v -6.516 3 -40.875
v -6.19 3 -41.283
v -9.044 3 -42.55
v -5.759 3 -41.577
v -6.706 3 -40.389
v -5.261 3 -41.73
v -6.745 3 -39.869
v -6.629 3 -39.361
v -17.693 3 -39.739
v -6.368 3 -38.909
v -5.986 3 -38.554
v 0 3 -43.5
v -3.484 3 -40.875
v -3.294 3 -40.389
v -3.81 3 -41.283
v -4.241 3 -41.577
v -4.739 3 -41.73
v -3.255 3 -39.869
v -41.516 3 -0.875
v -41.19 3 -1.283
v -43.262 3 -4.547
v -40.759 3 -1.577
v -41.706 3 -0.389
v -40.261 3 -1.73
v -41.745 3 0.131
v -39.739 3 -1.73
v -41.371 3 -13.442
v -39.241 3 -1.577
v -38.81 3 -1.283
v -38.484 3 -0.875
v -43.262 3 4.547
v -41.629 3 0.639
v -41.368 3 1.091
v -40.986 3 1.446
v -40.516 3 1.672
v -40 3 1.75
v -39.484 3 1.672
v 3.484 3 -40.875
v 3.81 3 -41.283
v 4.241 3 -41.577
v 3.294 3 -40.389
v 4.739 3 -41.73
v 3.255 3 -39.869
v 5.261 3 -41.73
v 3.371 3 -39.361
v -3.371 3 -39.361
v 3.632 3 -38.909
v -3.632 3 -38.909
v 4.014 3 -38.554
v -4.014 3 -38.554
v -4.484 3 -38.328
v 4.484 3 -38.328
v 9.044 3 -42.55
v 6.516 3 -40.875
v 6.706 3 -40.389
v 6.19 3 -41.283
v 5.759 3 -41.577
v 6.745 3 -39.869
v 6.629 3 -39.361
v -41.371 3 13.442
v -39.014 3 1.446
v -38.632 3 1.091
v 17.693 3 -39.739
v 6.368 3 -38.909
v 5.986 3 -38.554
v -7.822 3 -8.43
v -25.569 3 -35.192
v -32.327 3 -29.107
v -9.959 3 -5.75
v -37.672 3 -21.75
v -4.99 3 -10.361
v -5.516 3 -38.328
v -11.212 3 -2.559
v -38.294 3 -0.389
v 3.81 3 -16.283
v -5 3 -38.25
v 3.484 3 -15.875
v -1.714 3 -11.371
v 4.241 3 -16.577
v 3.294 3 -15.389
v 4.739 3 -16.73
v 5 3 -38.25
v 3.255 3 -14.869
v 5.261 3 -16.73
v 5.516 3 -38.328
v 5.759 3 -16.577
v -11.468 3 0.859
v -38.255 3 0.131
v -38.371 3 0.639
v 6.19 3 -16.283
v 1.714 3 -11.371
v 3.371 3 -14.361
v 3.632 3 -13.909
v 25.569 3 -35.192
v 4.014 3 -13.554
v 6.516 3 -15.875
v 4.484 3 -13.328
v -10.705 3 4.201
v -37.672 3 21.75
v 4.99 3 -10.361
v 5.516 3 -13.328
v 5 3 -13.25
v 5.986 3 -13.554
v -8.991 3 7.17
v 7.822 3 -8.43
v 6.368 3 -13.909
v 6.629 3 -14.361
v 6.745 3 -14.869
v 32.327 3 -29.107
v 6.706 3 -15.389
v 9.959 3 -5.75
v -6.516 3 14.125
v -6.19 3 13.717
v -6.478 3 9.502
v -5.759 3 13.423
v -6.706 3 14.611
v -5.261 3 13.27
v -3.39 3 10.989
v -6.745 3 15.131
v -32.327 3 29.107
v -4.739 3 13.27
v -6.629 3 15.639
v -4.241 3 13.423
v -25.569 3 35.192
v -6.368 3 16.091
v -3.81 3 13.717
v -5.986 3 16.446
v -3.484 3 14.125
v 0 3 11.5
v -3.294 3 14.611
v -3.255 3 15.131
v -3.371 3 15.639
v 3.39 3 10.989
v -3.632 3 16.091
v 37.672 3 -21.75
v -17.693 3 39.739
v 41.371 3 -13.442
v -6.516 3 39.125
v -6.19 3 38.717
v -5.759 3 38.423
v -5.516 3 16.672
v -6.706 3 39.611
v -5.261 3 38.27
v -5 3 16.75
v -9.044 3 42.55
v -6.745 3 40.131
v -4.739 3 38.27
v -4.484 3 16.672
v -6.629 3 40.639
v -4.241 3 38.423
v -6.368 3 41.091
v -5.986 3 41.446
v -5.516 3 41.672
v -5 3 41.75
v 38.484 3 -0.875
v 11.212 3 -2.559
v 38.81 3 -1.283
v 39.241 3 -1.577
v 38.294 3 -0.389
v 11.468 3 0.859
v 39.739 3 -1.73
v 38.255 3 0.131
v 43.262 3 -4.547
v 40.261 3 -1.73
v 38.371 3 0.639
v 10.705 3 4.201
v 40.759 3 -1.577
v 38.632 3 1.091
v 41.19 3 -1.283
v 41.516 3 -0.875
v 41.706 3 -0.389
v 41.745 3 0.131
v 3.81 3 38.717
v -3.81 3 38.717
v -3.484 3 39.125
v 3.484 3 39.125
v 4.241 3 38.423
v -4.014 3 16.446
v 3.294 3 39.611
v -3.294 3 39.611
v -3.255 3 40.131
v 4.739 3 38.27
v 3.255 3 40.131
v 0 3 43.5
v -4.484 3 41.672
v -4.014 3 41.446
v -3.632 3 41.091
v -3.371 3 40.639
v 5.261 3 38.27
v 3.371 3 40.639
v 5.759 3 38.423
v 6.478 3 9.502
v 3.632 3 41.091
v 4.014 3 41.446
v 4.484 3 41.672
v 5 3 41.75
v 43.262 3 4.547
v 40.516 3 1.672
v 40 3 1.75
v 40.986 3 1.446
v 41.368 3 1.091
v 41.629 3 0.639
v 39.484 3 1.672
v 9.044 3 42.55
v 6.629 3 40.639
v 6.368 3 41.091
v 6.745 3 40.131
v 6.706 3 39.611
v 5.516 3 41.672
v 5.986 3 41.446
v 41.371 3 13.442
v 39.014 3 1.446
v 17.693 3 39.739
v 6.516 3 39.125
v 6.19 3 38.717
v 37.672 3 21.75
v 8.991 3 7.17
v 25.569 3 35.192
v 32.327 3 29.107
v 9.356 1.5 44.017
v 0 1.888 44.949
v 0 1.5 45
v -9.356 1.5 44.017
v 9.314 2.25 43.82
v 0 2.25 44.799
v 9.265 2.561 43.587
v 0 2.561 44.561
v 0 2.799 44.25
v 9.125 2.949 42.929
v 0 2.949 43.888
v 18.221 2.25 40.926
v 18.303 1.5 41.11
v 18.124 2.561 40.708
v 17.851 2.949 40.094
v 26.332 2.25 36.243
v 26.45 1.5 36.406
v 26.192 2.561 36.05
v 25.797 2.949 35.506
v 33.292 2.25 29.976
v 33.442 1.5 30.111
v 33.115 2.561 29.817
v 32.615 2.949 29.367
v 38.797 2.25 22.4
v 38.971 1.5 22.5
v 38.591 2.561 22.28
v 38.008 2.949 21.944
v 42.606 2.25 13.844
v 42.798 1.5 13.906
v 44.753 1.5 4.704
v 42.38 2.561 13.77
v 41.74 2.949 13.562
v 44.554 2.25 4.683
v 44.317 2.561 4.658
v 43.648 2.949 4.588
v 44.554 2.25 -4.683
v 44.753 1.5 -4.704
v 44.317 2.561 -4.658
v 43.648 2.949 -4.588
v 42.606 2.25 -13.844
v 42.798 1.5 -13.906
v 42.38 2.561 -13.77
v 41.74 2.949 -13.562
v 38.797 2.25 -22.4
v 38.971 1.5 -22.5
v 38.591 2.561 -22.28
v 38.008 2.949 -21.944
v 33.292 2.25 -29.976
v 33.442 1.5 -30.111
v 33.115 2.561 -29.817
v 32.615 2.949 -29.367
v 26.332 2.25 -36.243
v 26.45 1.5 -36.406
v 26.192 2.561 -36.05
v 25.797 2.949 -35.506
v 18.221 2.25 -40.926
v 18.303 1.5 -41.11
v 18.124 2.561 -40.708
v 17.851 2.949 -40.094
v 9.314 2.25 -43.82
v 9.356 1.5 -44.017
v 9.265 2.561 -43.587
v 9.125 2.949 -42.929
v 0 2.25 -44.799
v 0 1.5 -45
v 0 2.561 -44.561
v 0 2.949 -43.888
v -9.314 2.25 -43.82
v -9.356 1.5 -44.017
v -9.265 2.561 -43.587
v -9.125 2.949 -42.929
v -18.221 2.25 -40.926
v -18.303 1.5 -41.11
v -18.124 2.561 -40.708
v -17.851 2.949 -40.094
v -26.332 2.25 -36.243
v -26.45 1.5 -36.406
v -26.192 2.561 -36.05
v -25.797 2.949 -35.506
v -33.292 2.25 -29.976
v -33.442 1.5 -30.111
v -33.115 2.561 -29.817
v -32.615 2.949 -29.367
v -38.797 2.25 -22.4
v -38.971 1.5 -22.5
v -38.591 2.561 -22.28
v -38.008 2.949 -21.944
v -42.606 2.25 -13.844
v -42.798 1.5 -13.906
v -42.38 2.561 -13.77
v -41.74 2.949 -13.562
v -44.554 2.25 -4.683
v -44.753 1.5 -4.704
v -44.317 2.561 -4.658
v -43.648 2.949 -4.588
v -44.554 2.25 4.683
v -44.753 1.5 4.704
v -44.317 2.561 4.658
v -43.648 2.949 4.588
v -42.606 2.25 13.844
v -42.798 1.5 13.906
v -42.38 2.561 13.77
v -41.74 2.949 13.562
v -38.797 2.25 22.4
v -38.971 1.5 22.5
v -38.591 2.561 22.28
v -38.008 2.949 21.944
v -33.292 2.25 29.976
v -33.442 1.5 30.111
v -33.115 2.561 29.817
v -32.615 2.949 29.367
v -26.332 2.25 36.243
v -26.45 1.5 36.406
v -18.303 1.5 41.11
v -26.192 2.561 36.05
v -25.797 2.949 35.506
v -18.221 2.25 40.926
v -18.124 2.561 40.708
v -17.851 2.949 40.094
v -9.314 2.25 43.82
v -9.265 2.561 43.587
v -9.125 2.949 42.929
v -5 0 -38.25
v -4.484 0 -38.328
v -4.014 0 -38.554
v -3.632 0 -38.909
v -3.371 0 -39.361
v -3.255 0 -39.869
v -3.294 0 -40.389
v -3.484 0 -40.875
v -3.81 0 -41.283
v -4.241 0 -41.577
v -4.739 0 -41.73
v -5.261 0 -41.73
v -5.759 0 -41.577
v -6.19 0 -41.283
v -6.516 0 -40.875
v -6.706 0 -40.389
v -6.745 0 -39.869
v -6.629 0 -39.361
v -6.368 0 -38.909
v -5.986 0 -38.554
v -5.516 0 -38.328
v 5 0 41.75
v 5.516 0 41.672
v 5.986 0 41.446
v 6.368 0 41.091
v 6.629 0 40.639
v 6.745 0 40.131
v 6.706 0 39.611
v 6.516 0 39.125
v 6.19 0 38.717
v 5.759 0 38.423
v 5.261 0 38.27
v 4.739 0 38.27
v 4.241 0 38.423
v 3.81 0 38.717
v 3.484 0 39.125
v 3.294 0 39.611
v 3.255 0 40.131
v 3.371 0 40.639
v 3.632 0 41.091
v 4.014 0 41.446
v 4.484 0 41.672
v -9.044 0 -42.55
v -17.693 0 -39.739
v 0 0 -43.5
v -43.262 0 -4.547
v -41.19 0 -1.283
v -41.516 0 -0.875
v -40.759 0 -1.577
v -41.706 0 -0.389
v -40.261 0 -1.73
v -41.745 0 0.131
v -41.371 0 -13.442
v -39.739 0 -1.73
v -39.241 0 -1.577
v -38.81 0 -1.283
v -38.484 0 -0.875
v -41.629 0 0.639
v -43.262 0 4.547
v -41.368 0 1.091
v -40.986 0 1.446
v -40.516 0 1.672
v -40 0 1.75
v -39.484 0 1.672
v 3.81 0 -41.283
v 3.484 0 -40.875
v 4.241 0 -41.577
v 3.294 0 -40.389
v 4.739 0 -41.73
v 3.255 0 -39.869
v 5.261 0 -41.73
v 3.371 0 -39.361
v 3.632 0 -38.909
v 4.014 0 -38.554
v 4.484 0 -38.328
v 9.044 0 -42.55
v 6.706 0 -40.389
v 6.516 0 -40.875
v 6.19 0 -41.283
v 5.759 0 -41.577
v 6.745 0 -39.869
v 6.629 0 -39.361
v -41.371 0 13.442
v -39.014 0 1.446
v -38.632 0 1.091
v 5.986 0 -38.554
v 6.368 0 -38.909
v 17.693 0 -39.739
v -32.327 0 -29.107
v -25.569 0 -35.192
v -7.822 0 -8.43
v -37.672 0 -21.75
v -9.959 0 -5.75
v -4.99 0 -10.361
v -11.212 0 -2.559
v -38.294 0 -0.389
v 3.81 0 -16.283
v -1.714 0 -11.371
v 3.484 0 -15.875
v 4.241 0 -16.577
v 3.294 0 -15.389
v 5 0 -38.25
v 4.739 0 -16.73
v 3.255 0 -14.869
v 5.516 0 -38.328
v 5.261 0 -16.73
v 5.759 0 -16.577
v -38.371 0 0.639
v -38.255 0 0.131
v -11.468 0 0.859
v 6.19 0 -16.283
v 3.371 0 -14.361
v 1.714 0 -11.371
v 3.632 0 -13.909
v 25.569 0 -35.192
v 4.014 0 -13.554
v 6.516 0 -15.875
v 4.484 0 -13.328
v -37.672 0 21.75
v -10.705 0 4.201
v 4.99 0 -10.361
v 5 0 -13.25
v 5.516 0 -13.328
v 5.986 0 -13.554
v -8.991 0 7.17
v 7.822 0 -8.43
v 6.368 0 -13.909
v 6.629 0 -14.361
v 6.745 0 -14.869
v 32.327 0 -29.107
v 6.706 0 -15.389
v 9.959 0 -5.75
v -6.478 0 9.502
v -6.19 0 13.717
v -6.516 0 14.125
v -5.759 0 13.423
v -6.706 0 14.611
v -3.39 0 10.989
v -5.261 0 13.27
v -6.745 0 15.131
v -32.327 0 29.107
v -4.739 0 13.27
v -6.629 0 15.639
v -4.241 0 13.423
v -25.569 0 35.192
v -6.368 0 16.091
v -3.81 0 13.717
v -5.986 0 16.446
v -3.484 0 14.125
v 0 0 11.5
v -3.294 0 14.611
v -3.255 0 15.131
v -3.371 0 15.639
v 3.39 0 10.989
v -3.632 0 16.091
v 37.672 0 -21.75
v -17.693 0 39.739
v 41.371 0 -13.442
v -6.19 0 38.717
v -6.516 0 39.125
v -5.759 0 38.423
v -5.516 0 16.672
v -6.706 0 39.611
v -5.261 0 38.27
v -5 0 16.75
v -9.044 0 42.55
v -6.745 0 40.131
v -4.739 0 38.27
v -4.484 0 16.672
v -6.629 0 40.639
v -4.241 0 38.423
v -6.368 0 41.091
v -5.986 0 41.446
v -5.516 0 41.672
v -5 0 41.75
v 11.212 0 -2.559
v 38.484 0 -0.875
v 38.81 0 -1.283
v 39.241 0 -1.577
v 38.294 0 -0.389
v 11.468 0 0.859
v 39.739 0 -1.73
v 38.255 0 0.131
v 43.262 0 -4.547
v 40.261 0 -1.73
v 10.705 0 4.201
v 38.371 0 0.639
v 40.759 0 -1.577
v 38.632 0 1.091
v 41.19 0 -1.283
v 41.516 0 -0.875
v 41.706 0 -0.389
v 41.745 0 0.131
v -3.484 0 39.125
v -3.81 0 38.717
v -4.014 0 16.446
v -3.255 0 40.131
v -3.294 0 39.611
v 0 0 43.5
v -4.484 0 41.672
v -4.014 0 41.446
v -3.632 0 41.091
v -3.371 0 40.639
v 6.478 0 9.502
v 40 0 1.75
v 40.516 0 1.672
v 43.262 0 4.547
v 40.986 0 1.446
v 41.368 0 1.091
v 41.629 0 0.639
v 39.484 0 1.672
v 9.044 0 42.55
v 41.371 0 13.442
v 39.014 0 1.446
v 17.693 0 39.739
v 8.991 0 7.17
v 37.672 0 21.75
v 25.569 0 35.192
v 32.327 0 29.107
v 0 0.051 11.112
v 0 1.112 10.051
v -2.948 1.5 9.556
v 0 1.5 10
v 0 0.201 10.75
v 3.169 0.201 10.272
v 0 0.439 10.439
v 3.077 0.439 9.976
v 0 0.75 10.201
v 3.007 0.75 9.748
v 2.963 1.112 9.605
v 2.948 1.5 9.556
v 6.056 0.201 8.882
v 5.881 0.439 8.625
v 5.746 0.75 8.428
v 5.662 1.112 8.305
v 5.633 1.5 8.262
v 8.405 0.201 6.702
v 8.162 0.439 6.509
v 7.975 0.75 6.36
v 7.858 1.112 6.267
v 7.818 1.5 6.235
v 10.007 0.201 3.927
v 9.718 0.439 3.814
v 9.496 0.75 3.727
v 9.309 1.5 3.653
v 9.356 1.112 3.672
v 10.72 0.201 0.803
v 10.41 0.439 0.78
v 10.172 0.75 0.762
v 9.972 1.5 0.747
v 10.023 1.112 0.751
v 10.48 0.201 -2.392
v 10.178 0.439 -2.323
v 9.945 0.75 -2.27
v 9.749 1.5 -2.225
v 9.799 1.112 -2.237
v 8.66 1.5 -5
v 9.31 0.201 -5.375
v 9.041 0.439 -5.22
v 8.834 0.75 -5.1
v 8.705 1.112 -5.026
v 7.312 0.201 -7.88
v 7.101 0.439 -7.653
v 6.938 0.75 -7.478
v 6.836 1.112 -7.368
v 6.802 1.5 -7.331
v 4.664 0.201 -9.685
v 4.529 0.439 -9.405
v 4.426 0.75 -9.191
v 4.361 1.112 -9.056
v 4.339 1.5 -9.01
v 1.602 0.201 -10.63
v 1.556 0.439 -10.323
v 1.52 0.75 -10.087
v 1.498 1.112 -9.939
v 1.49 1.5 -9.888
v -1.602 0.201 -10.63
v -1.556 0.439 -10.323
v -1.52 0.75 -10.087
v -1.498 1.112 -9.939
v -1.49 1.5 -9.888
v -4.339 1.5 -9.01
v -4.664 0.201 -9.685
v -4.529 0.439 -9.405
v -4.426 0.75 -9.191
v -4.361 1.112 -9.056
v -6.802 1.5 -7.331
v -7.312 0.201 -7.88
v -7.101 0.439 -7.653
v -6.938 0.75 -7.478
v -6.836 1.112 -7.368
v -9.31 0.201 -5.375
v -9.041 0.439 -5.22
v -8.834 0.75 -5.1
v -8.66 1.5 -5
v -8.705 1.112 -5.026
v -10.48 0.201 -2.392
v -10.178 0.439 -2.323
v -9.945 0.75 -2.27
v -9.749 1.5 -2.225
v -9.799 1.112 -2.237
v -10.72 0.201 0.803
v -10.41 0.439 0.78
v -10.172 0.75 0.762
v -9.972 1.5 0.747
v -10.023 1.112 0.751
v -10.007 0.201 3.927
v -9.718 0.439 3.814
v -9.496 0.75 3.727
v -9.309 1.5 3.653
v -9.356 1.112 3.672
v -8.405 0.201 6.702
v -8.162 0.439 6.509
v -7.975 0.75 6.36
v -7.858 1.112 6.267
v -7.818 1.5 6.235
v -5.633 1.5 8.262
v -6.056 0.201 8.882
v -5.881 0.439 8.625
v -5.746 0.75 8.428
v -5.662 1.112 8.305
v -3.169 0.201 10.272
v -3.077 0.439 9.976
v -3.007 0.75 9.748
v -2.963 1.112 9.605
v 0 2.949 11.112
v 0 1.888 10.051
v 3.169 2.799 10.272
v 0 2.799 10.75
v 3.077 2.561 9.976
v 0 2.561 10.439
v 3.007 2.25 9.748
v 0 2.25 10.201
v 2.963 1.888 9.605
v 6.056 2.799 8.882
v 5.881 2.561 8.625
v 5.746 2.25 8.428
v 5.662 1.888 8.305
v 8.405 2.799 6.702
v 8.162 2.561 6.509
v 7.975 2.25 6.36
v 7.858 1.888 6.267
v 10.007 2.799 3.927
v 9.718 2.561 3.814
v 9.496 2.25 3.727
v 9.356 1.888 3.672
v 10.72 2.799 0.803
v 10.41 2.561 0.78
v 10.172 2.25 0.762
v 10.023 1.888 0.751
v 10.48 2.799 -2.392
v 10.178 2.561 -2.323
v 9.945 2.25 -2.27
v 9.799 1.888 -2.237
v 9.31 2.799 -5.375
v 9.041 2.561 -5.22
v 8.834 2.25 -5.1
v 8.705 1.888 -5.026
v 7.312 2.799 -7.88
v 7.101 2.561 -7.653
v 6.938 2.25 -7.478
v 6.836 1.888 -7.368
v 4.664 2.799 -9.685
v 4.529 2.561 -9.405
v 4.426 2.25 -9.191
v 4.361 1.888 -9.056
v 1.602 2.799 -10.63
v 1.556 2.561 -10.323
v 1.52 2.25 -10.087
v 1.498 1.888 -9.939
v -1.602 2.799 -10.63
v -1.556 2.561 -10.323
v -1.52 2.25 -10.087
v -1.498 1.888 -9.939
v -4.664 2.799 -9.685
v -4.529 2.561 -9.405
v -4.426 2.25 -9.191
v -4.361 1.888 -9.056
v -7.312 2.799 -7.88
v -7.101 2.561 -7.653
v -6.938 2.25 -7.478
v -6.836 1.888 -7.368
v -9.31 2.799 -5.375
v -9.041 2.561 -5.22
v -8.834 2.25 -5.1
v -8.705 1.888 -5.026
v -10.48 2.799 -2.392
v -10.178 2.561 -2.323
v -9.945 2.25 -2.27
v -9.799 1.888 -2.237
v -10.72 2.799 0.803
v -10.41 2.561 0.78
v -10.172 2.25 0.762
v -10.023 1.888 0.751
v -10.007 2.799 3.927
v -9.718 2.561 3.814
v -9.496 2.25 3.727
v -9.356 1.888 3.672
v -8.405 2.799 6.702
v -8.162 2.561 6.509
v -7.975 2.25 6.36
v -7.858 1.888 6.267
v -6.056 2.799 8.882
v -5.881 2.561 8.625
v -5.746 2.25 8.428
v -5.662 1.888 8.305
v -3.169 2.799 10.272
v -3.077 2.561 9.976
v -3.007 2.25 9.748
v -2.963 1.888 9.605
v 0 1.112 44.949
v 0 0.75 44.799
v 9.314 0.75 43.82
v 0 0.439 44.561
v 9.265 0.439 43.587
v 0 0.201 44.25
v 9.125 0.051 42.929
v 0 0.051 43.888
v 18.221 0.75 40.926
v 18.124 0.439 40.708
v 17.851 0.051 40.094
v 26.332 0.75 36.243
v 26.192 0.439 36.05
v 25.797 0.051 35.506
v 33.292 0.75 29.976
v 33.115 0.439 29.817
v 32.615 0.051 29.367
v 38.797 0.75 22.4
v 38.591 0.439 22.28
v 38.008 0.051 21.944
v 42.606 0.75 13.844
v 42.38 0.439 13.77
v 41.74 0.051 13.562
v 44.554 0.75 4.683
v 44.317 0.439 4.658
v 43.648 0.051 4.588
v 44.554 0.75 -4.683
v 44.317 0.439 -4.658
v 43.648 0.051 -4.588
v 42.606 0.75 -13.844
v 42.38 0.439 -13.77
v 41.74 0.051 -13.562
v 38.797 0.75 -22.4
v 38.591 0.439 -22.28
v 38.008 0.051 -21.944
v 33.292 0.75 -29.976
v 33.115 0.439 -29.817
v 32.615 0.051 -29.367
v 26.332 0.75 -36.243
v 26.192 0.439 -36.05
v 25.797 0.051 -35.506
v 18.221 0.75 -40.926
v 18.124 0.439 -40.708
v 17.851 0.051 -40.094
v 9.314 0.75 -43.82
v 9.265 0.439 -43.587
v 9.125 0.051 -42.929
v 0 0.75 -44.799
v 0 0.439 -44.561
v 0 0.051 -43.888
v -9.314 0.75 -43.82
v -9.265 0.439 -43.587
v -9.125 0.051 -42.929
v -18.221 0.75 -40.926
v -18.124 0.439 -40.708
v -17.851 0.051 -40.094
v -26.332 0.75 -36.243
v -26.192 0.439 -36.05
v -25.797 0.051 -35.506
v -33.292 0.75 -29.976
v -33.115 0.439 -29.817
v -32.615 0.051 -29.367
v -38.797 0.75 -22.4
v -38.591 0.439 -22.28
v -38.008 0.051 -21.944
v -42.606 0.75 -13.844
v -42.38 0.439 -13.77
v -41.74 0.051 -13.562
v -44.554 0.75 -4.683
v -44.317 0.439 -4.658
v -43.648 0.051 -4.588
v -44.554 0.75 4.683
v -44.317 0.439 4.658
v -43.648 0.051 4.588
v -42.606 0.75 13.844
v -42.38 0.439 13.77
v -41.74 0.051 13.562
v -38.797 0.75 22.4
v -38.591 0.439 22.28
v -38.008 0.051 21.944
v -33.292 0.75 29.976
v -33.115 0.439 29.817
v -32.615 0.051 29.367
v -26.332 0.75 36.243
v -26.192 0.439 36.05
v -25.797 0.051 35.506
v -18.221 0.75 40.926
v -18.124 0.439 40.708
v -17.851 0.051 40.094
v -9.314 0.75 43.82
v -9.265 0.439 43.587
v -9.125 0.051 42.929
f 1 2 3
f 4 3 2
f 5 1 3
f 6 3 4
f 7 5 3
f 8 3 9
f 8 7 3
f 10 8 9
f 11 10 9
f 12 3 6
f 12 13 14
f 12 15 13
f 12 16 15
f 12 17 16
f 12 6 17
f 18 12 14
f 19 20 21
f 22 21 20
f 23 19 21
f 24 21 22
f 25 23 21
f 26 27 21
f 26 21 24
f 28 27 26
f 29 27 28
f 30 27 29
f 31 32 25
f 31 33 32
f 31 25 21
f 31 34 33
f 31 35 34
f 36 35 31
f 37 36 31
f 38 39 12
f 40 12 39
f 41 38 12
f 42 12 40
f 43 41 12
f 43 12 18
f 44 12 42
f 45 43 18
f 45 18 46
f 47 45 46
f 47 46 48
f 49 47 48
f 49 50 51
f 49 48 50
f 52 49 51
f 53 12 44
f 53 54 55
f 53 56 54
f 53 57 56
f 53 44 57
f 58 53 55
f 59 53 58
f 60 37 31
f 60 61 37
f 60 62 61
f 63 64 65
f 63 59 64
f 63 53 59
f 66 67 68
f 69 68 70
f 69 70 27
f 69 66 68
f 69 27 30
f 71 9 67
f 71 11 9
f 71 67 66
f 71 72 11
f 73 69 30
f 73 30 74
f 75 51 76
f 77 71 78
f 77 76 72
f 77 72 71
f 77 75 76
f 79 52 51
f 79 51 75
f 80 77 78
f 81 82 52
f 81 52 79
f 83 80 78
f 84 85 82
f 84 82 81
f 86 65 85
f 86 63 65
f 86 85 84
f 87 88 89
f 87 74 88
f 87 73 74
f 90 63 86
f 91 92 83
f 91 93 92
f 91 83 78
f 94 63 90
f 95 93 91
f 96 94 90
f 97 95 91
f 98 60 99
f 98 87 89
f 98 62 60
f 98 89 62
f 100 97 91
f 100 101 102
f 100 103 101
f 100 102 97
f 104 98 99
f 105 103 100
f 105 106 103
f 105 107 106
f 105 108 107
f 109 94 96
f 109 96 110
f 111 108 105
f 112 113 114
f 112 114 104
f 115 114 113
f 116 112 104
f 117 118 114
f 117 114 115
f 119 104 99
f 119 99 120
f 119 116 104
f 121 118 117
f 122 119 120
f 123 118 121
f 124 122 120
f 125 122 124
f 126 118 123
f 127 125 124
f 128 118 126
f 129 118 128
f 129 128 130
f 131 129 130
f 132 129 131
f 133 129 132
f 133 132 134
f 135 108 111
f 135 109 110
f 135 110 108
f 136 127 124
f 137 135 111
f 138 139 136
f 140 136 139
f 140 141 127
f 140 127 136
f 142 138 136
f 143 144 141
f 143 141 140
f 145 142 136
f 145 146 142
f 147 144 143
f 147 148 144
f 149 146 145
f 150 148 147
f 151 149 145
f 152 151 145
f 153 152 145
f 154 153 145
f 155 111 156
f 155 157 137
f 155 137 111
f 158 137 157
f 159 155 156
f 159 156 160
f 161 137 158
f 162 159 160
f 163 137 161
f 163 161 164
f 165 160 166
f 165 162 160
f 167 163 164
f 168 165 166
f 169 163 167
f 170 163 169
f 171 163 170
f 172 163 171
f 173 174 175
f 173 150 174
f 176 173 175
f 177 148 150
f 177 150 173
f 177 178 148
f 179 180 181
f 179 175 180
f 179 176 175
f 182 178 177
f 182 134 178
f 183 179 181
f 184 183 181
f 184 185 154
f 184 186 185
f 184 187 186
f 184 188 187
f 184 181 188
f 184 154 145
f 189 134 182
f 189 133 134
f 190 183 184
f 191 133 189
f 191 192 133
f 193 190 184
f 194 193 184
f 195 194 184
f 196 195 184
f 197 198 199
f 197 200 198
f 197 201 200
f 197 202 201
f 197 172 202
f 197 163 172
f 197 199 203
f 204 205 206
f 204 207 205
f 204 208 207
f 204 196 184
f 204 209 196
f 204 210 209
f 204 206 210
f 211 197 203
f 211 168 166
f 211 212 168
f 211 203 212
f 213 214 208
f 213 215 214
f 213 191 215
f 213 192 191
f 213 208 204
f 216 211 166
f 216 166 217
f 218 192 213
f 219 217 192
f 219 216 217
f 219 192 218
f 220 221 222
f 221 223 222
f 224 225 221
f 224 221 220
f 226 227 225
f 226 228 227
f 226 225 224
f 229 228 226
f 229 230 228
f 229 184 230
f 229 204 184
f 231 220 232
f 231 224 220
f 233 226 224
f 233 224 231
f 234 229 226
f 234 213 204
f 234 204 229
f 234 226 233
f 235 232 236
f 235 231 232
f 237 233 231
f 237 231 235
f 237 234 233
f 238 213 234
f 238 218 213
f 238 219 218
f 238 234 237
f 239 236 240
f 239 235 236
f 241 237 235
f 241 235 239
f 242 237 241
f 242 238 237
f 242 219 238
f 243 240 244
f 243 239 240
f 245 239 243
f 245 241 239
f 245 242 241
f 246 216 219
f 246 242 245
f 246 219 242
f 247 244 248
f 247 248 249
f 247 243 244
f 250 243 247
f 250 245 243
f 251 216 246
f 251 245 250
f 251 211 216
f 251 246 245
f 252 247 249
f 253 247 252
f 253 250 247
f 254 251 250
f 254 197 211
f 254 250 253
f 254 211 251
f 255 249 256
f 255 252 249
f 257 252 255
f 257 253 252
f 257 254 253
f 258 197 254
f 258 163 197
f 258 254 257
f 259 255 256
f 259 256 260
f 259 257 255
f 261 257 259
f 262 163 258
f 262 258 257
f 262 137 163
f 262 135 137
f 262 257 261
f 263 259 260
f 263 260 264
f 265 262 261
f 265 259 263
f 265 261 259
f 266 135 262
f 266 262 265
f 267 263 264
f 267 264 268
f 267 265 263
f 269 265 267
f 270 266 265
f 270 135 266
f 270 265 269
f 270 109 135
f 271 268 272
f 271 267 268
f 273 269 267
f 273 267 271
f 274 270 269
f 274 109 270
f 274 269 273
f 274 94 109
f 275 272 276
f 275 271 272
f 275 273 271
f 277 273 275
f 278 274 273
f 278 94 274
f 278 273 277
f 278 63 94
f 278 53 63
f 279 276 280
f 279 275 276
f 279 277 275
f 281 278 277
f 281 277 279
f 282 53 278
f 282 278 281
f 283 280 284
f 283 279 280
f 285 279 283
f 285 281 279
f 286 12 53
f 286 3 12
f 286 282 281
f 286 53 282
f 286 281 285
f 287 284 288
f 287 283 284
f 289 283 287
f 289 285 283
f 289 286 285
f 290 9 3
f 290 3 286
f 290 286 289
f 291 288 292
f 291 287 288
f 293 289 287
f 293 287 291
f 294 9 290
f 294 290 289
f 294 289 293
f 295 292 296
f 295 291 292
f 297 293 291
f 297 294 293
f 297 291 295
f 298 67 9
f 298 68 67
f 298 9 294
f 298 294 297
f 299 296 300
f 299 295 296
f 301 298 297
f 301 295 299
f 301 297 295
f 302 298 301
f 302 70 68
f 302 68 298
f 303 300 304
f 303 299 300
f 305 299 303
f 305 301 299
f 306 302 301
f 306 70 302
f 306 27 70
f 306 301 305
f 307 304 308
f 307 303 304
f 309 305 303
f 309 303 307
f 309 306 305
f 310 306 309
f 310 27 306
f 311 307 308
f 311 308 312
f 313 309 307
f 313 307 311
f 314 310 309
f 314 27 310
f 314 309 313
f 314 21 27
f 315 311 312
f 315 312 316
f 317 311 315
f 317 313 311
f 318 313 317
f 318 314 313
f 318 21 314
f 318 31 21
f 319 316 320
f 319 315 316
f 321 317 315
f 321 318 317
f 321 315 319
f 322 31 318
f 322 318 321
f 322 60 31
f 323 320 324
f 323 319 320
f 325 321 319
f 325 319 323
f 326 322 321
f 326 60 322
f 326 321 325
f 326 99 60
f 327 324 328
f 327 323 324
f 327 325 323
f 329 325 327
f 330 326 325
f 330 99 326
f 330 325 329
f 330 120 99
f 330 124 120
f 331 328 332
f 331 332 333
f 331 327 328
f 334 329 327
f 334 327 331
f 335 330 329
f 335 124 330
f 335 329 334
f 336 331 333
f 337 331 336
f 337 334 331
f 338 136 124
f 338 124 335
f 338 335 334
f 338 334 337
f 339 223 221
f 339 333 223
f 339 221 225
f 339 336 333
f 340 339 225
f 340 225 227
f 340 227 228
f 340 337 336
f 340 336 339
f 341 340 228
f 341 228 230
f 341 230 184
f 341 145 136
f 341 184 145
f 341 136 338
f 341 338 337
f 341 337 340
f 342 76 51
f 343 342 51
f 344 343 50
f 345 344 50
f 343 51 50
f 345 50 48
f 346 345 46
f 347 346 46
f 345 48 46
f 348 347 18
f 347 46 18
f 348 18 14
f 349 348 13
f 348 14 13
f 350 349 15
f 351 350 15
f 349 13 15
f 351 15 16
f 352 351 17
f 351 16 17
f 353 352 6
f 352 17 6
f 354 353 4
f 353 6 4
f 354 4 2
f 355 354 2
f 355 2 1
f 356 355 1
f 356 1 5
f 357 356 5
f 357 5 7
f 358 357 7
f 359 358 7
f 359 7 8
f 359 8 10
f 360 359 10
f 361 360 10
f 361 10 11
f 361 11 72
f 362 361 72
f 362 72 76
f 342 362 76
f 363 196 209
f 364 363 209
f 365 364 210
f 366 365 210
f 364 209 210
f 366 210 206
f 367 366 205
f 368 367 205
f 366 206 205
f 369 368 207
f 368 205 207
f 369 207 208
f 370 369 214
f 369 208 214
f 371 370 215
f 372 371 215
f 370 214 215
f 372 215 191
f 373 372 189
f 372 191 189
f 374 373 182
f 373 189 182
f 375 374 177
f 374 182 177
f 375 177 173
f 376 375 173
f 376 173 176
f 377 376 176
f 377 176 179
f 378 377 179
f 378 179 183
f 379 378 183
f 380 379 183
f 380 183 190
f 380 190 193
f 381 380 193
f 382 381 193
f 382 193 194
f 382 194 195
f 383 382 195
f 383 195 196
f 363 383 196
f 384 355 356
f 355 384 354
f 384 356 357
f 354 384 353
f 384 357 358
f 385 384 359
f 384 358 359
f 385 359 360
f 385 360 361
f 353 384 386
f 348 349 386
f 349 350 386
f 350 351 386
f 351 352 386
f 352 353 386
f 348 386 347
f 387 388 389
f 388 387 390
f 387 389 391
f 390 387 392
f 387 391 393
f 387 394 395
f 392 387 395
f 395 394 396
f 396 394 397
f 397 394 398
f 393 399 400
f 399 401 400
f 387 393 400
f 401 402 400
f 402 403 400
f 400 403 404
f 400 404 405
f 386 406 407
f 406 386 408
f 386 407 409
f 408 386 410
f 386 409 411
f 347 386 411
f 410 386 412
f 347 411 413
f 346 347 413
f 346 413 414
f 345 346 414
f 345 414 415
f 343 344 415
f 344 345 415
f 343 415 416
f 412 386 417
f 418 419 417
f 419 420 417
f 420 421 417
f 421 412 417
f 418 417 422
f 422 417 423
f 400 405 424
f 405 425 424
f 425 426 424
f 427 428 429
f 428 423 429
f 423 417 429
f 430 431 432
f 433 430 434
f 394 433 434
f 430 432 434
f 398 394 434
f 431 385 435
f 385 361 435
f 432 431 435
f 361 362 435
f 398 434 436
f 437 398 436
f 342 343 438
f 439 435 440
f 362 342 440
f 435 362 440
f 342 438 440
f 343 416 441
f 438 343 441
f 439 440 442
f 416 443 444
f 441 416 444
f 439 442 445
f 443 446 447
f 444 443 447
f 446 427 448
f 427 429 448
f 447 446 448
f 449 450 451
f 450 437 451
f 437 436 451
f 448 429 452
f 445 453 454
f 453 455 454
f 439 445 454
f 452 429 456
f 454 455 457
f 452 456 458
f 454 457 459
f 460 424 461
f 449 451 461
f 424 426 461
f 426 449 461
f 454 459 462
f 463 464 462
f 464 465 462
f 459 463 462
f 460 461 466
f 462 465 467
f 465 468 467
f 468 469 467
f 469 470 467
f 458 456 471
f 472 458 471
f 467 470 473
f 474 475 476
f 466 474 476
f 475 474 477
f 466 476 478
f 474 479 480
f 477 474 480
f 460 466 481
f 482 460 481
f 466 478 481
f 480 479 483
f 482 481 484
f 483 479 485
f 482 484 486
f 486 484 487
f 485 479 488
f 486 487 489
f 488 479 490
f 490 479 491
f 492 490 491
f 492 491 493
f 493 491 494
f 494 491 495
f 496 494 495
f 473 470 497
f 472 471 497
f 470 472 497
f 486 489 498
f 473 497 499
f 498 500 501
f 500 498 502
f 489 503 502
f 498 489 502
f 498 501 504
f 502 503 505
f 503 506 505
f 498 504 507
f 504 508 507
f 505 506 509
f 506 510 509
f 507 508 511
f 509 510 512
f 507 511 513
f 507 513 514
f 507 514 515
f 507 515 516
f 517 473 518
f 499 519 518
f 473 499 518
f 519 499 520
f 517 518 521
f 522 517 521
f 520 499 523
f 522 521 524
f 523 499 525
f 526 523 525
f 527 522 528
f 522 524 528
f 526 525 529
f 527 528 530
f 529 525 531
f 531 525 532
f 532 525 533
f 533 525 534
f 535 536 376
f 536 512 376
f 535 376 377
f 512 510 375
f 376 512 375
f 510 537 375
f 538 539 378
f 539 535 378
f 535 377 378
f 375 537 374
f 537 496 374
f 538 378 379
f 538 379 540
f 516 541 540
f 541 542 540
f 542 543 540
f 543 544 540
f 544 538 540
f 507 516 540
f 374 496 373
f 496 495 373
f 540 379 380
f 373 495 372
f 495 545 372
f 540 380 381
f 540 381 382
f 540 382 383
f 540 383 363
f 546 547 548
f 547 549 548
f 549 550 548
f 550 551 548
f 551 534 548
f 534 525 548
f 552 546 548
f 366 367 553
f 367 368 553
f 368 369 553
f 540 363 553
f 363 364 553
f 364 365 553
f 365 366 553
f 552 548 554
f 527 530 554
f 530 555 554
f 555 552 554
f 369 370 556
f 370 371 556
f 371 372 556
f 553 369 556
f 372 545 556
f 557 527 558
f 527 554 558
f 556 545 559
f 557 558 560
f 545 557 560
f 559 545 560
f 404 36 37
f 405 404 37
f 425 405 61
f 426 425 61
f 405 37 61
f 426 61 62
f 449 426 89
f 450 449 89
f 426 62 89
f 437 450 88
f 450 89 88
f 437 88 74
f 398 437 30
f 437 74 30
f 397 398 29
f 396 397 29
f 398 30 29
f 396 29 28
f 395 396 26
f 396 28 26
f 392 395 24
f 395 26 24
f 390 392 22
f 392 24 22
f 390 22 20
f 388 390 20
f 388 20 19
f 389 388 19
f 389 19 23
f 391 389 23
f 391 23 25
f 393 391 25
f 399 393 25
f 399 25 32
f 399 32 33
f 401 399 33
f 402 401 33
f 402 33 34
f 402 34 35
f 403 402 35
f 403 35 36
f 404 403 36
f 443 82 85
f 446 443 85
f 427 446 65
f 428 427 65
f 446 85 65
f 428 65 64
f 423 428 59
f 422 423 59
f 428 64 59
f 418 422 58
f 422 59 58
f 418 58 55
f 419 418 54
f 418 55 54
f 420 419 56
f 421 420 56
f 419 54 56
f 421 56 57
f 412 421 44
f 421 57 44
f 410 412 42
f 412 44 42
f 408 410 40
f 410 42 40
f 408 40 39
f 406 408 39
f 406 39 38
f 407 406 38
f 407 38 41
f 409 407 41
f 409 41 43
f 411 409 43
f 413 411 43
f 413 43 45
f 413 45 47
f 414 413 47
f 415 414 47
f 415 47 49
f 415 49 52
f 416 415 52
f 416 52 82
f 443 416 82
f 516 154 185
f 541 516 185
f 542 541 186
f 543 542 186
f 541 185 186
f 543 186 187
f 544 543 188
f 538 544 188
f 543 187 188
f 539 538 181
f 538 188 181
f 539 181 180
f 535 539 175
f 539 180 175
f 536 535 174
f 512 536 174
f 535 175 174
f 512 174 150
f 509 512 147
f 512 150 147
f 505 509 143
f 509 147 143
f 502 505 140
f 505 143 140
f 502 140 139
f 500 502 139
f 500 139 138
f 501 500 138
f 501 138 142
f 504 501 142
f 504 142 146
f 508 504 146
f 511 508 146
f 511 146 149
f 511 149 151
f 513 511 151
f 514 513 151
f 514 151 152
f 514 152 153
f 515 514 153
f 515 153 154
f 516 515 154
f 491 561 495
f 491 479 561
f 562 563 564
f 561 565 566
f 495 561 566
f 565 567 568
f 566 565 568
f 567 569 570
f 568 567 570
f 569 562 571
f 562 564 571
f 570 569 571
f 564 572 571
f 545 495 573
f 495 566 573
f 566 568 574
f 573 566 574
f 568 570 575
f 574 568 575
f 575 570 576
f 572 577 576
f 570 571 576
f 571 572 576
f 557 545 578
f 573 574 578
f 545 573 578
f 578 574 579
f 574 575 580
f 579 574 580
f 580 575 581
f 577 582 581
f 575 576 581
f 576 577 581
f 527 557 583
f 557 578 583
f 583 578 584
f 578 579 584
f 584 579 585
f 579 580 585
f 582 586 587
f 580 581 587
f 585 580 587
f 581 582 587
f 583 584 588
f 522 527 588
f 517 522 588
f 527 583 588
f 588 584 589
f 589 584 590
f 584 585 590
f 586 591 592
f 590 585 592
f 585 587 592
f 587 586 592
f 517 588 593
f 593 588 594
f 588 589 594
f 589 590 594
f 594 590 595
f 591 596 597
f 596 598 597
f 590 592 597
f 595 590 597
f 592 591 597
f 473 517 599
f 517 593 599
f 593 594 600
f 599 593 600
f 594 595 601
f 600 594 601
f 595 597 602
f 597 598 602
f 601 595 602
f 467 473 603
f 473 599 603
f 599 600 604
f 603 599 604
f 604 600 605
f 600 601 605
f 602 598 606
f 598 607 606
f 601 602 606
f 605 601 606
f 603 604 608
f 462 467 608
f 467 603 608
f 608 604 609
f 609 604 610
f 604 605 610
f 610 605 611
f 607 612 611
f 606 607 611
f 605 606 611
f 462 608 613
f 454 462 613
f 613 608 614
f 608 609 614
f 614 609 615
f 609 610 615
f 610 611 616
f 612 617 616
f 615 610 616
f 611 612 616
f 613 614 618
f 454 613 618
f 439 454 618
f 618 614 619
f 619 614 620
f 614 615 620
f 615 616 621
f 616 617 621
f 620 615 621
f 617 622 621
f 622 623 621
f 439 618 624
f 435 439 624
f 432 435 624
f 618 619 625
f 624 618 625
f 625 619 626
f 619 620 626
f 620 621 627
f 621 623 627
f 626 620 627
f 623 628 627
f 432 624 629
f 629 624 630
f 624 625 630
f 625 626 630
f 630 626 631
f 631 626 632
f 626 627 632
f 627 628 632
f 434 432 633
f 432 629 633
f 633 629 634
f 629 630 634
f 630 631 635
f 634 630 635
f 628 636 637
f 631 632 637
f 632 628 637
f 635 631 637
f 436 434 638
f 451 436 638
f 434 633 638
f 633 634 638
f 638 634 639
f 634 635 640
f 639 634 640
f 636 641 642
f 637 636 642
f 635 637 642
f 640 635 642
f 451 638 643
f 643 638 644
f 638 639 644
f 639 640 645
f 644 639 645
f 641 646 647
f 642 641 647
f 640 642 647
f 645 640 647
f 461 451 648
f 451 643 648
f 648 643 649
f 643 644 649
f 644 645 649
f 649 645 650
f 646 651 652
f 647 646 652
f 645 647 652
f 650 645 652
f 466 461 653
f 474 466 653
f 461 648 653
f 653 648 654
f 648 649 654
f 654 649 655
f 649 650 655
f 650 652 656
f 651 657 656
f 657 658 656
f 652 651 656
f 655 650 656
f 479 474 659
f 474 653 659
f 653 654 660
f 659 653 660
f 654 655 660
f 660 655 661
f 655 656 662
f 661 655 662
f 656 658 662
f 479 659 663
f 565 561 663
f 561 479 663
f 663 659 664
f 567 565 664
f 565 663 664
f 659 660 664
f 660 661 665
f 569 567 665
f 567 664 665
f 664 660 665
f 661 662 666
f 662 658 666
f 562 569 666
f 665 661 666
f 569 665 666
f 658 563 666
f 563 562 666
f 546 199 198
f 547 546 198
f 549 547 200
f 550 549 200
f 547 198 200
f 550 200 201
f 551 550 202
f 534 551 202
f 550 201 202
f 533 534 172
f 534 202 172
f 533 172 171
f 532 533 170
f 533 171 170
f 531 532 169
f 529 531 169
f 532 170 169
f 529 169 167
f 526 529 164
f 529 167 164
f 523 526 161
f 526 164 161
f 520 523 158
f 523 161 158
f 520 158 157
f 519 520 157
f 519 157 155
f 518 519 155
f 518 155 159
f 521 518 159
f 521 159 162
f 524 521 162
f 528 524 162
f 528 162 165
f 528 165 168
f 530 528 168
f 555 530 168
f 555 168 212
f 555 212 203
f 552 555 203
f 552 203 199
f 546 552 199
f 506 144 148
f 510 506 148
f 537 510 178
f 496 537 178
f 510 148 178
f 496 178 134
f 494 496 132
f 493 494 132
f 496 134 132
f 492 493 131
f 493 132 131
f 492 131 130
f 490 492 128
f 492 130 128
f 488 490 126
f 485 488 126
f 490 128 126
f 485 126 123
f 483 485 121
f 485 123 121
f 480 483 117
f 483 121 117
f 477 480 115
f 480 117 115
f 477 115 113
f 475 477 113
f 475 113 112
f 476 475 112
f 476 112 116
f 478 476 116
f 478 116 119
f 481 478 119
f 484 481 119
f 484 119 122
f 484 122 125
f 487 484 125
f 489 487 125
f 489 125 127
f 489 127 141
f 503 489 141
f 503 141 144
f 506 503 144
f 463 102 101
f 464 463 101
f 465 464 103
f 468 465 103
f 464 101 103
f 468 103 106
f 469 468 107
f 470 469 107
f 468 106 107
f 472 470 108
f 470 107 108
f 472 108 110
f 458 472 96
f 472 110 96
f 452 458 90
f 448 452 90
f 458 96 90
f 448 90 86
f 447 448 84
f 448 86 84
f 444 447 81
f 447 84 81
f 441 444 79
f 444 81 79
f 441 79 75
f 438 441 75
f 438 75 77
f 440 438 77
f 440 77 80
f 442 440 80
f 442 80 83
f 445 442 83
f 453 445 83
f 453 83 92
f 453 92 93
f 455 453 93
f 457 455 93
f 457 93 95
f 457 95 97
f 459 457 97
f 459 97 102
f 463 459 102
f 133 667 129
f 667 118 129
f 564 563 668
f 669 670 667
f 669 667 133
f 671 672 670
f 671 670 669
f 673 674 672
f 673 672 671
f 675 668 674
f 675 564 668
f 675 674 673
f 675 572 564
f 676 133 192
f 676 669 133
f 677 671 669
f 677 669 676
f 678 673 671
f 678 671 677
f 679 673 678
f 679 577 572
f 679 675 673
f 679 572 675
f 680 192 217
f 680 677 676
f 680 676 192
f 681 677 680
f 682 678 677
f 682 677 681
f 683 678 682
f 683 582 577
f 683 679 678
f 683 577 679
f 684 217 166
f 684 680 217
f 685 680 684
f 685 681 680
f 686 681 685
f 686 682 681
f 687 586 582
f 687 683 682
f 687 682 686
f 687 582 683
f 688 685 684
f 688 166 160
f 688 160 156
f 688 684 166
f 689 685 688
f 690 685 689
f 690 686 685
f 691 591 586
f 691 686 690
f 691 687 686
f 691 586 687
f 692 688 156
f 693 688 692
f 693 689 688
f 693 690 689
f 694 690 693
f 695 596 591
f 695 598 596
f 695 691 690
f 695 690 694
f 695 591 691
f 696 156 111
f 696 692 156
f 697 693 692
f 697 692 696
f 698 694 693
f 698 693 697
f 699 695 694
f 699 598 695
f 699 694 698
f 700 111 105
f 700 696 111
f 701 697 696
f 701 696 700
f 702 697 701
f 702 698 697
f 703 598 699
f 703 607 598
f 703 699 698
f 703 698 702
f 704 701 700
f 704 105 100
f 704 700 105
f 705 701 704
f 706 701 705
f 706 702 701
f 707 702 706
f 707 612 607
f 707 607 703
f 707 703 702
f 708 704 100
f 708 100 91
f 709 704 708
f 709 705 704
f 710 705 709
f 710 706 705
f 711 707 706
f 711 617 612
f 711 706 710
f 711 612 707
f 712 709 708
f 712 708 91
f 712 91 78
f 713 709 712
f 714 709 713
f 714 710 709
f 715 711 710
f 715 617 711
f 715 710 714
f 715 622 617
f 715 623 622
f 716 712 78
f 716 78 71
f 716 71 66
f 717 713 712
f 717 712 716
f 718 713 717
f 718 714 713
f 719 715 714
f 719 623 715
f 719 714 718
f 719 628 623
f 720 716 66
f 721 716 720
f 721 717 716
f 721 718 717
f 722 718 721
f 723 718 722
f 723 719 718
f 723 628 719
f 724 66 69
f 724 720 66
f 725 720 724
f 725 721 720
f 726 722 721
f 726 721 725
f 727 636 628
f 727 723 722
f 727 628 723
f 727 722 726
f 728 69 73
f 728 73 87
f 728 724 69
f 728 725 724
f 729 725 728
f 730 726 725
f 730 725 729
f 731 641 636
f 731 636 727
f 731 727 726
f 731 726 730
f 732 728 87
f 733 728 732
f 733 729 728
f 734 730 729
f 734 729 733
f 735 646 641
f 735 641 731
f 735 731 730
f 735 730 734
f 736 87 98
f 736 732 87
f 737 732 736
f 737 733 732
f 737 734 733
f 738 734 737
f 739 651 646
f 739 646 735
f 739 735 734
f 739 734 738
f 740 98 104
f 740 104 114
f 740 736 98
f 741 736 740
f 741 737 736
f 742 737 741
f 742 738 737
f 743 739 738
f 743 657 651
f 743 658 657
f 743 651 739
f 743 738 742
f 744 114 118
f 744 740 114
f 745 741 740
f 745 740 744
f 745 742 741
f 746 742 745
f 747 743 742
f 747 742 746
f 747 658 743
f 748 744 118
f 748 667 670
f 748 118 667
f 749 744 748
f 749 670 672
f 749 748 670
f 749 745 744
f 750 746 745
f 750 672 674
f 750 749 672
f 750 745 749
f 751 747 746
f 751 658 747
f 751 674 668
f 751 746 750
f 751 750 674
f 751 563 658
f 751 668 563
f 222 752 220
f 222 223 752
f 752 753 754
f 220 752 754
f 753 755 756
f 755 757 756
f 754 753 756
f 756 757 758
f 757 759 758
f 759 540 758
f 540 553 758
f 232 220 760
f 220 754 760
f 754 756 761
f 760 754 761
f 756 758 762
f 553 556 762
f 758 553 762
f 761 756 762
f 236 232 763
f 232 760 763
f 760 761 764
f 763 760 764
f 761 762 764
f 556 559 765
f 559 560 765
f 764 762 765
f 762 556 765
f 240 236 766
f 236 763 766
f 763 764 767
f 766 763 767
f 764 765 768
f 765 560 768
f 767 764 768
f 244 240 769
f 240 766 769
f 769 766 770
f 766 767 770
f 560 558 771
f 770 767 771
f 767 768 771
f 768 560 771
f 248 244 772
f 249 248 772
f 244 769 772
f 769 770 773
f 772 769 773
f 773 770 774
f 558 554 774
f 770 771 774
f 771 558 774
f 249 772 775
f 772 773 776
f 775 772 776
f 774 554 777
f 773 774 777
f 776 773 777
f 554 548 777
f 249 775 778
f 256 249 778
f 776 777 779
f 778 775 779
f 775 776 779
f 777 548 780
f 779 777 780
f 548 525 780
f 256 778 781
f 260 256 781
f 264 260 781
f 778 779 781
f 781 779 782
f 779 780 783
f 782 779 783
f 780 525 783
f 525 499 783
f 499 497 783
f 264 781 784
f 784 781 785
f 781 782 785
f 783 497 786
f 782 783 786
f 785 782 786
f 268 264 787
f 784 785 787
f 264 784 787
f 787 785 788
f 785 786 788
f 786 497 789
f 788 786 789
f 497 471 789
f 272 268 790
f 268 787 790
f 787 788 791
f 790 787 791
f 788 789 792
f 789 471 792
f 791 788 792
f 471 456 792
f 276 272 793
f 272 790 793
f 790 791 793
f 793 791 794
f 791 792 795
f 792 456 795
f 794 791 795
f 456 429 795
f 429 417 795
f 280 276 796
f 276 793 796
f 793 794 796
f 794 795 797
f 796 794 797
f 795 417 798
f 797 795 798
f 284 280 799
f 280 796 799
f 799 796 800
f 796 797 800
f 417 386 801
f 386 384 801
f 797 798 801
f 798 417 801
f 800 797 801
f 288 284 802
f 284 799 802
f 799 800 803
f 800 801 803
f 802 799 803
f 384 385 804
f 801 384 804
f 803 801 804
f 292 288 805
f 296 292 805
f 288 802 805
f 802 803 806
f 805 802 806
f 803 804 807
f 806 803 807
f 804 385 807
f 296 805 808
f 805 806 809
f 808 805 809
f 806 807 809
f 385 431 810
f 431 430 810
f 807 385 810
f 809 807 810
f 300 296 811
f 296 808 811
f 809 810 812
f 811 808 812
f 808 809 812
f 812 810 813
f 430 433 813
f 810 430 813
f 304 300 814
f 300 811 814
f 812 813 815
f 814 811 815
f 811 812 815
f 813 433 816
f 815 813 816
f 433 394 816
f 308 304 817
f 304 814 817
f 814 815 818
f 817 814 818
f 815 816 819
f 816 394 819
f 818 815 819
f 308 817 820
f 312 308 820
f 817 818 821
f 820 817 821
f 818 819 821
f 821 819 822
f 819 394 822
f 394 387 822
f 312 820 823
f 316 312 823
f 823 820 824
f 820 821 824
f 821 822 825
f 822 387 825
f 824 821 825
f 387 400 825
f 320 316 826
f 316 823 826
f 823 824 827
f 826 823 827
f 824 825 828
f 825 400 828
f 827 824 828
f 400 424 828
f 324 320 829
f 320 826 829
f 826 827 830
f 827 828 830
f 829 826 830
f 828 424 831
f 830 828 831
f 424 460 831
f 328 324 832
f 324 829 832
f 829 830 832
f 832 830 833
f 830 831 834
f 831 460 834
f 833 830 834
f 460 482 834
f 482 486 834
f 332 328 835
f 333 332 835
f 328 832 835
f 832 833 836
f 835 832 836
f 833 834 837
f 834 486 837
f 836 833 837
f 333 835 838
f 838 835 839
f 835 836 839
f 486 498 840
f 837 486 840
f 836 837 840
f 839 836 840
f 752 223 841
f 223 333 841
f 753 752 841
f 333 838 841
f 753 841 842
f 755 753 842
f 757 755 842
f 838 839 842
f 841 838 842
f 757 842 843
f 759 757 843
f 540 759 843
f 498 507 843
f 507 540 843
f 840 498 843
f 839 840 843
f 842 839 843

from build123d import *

# Parameters (mm, degrees)
SKETCH1_R           = 45
BOSS_EXTRUDE1_DEPTH = 3
SKETCH2_R           = 1.75
CUT_EXTRUDE1_DEPTH  = 10
SKETCH3_R           = 10
CUT_EXTRUDE2_DEPTH  = 5
FILLET1_R           = 1.5
FILLET2_R           = 1.5


with BuildPart() as part:
    # Sketch1 → Boss-Extrude1 (new body)
    with BuildSketch(Plane(origin=(0, 0, 0), x_dir=(1, 0, 0), z_dir=(0, 1, 0))):
        with Locations(Location((0, 0, 0), (0, 0, 270))):
            Circle(SKETCH1_R)
    extrude(amount=BOSS_EXTRUDE1_DEPTH)

    # Sketch2 → Cut-Extrude1 (cut)
    with BuildSketch(Plane(origin=(0, 3, 0), x_dir=(1, 0, 0), z_dir=(0, 1, 0))):
        with Locations(Location((-5, -40, 0), (0, 0, 270))):
            Circle(SKETCH2_R)
        with Locations(Location((5, -40, 0), (0, 0, 270))):
            Circle(SKETCH2_R)
        with Locations(Location((-5, 40, 0), (0, 0, 270))):
            Circle(SKETCH2_R)
        with Locations(Location((5, 40, 0), (0, 0, 270))):
            Circle(SKETCH2_R)
        with Locations(Location((-40, 0, 0), (0, 0, 270))):
            Circle(SKETCH2_R)
        with Locations(Location((40, 0, 0), (0, 0, 270))):
            Circle(SKETCH2_R)
        with Locations(Location((-5, -15, 0), (0, 0, 270))):
            Circle(SKETCH2_R)
        with Locations(Location((5, 15, 0), (0, 0, 270))):
            Circle(SKETCH2_R)
    extrude(amount=-CUT_EXTRUDE1_DEPTH, mode=Mode.SUBTRACT)

    # Sketch3 → Cut-Extrude2 (cut)
    with BuildSketch(Plane(origin=(0, 3, 0), x_dir=(1, 0, 0), z_dir=(0, 1, 0))):
        with Locations(Location((0, 0, 0), (0, 0, 270))):
            Circle(SKETCH3_R)
    extrude(amount=-CUT_EXTRUDE2_DEPTH, mode=Mode.SUBTRACT)

    # Fillet1
    fillet1_edges = [part.edges().sort_by_distance(p)[0] for p in [
        (0, 0, -45),
        (0, 3, -45),
    ]]
    fillet(fillet1_edges, radius=FILLET1_R - 0.0001)  # a hair under: the kernel refuses the full size

    # Fillet2
    fillet2_edges = [part.edges().sort_by_distance(p)[0] for p in [
        (0, 0, -10),
        (0, 3, -10),
    ]]
    fillet(fillet2_edges, radius=FILLET2_R - 0.0001)  # a hair under: the kernel refuses the full size


solid = part.part
